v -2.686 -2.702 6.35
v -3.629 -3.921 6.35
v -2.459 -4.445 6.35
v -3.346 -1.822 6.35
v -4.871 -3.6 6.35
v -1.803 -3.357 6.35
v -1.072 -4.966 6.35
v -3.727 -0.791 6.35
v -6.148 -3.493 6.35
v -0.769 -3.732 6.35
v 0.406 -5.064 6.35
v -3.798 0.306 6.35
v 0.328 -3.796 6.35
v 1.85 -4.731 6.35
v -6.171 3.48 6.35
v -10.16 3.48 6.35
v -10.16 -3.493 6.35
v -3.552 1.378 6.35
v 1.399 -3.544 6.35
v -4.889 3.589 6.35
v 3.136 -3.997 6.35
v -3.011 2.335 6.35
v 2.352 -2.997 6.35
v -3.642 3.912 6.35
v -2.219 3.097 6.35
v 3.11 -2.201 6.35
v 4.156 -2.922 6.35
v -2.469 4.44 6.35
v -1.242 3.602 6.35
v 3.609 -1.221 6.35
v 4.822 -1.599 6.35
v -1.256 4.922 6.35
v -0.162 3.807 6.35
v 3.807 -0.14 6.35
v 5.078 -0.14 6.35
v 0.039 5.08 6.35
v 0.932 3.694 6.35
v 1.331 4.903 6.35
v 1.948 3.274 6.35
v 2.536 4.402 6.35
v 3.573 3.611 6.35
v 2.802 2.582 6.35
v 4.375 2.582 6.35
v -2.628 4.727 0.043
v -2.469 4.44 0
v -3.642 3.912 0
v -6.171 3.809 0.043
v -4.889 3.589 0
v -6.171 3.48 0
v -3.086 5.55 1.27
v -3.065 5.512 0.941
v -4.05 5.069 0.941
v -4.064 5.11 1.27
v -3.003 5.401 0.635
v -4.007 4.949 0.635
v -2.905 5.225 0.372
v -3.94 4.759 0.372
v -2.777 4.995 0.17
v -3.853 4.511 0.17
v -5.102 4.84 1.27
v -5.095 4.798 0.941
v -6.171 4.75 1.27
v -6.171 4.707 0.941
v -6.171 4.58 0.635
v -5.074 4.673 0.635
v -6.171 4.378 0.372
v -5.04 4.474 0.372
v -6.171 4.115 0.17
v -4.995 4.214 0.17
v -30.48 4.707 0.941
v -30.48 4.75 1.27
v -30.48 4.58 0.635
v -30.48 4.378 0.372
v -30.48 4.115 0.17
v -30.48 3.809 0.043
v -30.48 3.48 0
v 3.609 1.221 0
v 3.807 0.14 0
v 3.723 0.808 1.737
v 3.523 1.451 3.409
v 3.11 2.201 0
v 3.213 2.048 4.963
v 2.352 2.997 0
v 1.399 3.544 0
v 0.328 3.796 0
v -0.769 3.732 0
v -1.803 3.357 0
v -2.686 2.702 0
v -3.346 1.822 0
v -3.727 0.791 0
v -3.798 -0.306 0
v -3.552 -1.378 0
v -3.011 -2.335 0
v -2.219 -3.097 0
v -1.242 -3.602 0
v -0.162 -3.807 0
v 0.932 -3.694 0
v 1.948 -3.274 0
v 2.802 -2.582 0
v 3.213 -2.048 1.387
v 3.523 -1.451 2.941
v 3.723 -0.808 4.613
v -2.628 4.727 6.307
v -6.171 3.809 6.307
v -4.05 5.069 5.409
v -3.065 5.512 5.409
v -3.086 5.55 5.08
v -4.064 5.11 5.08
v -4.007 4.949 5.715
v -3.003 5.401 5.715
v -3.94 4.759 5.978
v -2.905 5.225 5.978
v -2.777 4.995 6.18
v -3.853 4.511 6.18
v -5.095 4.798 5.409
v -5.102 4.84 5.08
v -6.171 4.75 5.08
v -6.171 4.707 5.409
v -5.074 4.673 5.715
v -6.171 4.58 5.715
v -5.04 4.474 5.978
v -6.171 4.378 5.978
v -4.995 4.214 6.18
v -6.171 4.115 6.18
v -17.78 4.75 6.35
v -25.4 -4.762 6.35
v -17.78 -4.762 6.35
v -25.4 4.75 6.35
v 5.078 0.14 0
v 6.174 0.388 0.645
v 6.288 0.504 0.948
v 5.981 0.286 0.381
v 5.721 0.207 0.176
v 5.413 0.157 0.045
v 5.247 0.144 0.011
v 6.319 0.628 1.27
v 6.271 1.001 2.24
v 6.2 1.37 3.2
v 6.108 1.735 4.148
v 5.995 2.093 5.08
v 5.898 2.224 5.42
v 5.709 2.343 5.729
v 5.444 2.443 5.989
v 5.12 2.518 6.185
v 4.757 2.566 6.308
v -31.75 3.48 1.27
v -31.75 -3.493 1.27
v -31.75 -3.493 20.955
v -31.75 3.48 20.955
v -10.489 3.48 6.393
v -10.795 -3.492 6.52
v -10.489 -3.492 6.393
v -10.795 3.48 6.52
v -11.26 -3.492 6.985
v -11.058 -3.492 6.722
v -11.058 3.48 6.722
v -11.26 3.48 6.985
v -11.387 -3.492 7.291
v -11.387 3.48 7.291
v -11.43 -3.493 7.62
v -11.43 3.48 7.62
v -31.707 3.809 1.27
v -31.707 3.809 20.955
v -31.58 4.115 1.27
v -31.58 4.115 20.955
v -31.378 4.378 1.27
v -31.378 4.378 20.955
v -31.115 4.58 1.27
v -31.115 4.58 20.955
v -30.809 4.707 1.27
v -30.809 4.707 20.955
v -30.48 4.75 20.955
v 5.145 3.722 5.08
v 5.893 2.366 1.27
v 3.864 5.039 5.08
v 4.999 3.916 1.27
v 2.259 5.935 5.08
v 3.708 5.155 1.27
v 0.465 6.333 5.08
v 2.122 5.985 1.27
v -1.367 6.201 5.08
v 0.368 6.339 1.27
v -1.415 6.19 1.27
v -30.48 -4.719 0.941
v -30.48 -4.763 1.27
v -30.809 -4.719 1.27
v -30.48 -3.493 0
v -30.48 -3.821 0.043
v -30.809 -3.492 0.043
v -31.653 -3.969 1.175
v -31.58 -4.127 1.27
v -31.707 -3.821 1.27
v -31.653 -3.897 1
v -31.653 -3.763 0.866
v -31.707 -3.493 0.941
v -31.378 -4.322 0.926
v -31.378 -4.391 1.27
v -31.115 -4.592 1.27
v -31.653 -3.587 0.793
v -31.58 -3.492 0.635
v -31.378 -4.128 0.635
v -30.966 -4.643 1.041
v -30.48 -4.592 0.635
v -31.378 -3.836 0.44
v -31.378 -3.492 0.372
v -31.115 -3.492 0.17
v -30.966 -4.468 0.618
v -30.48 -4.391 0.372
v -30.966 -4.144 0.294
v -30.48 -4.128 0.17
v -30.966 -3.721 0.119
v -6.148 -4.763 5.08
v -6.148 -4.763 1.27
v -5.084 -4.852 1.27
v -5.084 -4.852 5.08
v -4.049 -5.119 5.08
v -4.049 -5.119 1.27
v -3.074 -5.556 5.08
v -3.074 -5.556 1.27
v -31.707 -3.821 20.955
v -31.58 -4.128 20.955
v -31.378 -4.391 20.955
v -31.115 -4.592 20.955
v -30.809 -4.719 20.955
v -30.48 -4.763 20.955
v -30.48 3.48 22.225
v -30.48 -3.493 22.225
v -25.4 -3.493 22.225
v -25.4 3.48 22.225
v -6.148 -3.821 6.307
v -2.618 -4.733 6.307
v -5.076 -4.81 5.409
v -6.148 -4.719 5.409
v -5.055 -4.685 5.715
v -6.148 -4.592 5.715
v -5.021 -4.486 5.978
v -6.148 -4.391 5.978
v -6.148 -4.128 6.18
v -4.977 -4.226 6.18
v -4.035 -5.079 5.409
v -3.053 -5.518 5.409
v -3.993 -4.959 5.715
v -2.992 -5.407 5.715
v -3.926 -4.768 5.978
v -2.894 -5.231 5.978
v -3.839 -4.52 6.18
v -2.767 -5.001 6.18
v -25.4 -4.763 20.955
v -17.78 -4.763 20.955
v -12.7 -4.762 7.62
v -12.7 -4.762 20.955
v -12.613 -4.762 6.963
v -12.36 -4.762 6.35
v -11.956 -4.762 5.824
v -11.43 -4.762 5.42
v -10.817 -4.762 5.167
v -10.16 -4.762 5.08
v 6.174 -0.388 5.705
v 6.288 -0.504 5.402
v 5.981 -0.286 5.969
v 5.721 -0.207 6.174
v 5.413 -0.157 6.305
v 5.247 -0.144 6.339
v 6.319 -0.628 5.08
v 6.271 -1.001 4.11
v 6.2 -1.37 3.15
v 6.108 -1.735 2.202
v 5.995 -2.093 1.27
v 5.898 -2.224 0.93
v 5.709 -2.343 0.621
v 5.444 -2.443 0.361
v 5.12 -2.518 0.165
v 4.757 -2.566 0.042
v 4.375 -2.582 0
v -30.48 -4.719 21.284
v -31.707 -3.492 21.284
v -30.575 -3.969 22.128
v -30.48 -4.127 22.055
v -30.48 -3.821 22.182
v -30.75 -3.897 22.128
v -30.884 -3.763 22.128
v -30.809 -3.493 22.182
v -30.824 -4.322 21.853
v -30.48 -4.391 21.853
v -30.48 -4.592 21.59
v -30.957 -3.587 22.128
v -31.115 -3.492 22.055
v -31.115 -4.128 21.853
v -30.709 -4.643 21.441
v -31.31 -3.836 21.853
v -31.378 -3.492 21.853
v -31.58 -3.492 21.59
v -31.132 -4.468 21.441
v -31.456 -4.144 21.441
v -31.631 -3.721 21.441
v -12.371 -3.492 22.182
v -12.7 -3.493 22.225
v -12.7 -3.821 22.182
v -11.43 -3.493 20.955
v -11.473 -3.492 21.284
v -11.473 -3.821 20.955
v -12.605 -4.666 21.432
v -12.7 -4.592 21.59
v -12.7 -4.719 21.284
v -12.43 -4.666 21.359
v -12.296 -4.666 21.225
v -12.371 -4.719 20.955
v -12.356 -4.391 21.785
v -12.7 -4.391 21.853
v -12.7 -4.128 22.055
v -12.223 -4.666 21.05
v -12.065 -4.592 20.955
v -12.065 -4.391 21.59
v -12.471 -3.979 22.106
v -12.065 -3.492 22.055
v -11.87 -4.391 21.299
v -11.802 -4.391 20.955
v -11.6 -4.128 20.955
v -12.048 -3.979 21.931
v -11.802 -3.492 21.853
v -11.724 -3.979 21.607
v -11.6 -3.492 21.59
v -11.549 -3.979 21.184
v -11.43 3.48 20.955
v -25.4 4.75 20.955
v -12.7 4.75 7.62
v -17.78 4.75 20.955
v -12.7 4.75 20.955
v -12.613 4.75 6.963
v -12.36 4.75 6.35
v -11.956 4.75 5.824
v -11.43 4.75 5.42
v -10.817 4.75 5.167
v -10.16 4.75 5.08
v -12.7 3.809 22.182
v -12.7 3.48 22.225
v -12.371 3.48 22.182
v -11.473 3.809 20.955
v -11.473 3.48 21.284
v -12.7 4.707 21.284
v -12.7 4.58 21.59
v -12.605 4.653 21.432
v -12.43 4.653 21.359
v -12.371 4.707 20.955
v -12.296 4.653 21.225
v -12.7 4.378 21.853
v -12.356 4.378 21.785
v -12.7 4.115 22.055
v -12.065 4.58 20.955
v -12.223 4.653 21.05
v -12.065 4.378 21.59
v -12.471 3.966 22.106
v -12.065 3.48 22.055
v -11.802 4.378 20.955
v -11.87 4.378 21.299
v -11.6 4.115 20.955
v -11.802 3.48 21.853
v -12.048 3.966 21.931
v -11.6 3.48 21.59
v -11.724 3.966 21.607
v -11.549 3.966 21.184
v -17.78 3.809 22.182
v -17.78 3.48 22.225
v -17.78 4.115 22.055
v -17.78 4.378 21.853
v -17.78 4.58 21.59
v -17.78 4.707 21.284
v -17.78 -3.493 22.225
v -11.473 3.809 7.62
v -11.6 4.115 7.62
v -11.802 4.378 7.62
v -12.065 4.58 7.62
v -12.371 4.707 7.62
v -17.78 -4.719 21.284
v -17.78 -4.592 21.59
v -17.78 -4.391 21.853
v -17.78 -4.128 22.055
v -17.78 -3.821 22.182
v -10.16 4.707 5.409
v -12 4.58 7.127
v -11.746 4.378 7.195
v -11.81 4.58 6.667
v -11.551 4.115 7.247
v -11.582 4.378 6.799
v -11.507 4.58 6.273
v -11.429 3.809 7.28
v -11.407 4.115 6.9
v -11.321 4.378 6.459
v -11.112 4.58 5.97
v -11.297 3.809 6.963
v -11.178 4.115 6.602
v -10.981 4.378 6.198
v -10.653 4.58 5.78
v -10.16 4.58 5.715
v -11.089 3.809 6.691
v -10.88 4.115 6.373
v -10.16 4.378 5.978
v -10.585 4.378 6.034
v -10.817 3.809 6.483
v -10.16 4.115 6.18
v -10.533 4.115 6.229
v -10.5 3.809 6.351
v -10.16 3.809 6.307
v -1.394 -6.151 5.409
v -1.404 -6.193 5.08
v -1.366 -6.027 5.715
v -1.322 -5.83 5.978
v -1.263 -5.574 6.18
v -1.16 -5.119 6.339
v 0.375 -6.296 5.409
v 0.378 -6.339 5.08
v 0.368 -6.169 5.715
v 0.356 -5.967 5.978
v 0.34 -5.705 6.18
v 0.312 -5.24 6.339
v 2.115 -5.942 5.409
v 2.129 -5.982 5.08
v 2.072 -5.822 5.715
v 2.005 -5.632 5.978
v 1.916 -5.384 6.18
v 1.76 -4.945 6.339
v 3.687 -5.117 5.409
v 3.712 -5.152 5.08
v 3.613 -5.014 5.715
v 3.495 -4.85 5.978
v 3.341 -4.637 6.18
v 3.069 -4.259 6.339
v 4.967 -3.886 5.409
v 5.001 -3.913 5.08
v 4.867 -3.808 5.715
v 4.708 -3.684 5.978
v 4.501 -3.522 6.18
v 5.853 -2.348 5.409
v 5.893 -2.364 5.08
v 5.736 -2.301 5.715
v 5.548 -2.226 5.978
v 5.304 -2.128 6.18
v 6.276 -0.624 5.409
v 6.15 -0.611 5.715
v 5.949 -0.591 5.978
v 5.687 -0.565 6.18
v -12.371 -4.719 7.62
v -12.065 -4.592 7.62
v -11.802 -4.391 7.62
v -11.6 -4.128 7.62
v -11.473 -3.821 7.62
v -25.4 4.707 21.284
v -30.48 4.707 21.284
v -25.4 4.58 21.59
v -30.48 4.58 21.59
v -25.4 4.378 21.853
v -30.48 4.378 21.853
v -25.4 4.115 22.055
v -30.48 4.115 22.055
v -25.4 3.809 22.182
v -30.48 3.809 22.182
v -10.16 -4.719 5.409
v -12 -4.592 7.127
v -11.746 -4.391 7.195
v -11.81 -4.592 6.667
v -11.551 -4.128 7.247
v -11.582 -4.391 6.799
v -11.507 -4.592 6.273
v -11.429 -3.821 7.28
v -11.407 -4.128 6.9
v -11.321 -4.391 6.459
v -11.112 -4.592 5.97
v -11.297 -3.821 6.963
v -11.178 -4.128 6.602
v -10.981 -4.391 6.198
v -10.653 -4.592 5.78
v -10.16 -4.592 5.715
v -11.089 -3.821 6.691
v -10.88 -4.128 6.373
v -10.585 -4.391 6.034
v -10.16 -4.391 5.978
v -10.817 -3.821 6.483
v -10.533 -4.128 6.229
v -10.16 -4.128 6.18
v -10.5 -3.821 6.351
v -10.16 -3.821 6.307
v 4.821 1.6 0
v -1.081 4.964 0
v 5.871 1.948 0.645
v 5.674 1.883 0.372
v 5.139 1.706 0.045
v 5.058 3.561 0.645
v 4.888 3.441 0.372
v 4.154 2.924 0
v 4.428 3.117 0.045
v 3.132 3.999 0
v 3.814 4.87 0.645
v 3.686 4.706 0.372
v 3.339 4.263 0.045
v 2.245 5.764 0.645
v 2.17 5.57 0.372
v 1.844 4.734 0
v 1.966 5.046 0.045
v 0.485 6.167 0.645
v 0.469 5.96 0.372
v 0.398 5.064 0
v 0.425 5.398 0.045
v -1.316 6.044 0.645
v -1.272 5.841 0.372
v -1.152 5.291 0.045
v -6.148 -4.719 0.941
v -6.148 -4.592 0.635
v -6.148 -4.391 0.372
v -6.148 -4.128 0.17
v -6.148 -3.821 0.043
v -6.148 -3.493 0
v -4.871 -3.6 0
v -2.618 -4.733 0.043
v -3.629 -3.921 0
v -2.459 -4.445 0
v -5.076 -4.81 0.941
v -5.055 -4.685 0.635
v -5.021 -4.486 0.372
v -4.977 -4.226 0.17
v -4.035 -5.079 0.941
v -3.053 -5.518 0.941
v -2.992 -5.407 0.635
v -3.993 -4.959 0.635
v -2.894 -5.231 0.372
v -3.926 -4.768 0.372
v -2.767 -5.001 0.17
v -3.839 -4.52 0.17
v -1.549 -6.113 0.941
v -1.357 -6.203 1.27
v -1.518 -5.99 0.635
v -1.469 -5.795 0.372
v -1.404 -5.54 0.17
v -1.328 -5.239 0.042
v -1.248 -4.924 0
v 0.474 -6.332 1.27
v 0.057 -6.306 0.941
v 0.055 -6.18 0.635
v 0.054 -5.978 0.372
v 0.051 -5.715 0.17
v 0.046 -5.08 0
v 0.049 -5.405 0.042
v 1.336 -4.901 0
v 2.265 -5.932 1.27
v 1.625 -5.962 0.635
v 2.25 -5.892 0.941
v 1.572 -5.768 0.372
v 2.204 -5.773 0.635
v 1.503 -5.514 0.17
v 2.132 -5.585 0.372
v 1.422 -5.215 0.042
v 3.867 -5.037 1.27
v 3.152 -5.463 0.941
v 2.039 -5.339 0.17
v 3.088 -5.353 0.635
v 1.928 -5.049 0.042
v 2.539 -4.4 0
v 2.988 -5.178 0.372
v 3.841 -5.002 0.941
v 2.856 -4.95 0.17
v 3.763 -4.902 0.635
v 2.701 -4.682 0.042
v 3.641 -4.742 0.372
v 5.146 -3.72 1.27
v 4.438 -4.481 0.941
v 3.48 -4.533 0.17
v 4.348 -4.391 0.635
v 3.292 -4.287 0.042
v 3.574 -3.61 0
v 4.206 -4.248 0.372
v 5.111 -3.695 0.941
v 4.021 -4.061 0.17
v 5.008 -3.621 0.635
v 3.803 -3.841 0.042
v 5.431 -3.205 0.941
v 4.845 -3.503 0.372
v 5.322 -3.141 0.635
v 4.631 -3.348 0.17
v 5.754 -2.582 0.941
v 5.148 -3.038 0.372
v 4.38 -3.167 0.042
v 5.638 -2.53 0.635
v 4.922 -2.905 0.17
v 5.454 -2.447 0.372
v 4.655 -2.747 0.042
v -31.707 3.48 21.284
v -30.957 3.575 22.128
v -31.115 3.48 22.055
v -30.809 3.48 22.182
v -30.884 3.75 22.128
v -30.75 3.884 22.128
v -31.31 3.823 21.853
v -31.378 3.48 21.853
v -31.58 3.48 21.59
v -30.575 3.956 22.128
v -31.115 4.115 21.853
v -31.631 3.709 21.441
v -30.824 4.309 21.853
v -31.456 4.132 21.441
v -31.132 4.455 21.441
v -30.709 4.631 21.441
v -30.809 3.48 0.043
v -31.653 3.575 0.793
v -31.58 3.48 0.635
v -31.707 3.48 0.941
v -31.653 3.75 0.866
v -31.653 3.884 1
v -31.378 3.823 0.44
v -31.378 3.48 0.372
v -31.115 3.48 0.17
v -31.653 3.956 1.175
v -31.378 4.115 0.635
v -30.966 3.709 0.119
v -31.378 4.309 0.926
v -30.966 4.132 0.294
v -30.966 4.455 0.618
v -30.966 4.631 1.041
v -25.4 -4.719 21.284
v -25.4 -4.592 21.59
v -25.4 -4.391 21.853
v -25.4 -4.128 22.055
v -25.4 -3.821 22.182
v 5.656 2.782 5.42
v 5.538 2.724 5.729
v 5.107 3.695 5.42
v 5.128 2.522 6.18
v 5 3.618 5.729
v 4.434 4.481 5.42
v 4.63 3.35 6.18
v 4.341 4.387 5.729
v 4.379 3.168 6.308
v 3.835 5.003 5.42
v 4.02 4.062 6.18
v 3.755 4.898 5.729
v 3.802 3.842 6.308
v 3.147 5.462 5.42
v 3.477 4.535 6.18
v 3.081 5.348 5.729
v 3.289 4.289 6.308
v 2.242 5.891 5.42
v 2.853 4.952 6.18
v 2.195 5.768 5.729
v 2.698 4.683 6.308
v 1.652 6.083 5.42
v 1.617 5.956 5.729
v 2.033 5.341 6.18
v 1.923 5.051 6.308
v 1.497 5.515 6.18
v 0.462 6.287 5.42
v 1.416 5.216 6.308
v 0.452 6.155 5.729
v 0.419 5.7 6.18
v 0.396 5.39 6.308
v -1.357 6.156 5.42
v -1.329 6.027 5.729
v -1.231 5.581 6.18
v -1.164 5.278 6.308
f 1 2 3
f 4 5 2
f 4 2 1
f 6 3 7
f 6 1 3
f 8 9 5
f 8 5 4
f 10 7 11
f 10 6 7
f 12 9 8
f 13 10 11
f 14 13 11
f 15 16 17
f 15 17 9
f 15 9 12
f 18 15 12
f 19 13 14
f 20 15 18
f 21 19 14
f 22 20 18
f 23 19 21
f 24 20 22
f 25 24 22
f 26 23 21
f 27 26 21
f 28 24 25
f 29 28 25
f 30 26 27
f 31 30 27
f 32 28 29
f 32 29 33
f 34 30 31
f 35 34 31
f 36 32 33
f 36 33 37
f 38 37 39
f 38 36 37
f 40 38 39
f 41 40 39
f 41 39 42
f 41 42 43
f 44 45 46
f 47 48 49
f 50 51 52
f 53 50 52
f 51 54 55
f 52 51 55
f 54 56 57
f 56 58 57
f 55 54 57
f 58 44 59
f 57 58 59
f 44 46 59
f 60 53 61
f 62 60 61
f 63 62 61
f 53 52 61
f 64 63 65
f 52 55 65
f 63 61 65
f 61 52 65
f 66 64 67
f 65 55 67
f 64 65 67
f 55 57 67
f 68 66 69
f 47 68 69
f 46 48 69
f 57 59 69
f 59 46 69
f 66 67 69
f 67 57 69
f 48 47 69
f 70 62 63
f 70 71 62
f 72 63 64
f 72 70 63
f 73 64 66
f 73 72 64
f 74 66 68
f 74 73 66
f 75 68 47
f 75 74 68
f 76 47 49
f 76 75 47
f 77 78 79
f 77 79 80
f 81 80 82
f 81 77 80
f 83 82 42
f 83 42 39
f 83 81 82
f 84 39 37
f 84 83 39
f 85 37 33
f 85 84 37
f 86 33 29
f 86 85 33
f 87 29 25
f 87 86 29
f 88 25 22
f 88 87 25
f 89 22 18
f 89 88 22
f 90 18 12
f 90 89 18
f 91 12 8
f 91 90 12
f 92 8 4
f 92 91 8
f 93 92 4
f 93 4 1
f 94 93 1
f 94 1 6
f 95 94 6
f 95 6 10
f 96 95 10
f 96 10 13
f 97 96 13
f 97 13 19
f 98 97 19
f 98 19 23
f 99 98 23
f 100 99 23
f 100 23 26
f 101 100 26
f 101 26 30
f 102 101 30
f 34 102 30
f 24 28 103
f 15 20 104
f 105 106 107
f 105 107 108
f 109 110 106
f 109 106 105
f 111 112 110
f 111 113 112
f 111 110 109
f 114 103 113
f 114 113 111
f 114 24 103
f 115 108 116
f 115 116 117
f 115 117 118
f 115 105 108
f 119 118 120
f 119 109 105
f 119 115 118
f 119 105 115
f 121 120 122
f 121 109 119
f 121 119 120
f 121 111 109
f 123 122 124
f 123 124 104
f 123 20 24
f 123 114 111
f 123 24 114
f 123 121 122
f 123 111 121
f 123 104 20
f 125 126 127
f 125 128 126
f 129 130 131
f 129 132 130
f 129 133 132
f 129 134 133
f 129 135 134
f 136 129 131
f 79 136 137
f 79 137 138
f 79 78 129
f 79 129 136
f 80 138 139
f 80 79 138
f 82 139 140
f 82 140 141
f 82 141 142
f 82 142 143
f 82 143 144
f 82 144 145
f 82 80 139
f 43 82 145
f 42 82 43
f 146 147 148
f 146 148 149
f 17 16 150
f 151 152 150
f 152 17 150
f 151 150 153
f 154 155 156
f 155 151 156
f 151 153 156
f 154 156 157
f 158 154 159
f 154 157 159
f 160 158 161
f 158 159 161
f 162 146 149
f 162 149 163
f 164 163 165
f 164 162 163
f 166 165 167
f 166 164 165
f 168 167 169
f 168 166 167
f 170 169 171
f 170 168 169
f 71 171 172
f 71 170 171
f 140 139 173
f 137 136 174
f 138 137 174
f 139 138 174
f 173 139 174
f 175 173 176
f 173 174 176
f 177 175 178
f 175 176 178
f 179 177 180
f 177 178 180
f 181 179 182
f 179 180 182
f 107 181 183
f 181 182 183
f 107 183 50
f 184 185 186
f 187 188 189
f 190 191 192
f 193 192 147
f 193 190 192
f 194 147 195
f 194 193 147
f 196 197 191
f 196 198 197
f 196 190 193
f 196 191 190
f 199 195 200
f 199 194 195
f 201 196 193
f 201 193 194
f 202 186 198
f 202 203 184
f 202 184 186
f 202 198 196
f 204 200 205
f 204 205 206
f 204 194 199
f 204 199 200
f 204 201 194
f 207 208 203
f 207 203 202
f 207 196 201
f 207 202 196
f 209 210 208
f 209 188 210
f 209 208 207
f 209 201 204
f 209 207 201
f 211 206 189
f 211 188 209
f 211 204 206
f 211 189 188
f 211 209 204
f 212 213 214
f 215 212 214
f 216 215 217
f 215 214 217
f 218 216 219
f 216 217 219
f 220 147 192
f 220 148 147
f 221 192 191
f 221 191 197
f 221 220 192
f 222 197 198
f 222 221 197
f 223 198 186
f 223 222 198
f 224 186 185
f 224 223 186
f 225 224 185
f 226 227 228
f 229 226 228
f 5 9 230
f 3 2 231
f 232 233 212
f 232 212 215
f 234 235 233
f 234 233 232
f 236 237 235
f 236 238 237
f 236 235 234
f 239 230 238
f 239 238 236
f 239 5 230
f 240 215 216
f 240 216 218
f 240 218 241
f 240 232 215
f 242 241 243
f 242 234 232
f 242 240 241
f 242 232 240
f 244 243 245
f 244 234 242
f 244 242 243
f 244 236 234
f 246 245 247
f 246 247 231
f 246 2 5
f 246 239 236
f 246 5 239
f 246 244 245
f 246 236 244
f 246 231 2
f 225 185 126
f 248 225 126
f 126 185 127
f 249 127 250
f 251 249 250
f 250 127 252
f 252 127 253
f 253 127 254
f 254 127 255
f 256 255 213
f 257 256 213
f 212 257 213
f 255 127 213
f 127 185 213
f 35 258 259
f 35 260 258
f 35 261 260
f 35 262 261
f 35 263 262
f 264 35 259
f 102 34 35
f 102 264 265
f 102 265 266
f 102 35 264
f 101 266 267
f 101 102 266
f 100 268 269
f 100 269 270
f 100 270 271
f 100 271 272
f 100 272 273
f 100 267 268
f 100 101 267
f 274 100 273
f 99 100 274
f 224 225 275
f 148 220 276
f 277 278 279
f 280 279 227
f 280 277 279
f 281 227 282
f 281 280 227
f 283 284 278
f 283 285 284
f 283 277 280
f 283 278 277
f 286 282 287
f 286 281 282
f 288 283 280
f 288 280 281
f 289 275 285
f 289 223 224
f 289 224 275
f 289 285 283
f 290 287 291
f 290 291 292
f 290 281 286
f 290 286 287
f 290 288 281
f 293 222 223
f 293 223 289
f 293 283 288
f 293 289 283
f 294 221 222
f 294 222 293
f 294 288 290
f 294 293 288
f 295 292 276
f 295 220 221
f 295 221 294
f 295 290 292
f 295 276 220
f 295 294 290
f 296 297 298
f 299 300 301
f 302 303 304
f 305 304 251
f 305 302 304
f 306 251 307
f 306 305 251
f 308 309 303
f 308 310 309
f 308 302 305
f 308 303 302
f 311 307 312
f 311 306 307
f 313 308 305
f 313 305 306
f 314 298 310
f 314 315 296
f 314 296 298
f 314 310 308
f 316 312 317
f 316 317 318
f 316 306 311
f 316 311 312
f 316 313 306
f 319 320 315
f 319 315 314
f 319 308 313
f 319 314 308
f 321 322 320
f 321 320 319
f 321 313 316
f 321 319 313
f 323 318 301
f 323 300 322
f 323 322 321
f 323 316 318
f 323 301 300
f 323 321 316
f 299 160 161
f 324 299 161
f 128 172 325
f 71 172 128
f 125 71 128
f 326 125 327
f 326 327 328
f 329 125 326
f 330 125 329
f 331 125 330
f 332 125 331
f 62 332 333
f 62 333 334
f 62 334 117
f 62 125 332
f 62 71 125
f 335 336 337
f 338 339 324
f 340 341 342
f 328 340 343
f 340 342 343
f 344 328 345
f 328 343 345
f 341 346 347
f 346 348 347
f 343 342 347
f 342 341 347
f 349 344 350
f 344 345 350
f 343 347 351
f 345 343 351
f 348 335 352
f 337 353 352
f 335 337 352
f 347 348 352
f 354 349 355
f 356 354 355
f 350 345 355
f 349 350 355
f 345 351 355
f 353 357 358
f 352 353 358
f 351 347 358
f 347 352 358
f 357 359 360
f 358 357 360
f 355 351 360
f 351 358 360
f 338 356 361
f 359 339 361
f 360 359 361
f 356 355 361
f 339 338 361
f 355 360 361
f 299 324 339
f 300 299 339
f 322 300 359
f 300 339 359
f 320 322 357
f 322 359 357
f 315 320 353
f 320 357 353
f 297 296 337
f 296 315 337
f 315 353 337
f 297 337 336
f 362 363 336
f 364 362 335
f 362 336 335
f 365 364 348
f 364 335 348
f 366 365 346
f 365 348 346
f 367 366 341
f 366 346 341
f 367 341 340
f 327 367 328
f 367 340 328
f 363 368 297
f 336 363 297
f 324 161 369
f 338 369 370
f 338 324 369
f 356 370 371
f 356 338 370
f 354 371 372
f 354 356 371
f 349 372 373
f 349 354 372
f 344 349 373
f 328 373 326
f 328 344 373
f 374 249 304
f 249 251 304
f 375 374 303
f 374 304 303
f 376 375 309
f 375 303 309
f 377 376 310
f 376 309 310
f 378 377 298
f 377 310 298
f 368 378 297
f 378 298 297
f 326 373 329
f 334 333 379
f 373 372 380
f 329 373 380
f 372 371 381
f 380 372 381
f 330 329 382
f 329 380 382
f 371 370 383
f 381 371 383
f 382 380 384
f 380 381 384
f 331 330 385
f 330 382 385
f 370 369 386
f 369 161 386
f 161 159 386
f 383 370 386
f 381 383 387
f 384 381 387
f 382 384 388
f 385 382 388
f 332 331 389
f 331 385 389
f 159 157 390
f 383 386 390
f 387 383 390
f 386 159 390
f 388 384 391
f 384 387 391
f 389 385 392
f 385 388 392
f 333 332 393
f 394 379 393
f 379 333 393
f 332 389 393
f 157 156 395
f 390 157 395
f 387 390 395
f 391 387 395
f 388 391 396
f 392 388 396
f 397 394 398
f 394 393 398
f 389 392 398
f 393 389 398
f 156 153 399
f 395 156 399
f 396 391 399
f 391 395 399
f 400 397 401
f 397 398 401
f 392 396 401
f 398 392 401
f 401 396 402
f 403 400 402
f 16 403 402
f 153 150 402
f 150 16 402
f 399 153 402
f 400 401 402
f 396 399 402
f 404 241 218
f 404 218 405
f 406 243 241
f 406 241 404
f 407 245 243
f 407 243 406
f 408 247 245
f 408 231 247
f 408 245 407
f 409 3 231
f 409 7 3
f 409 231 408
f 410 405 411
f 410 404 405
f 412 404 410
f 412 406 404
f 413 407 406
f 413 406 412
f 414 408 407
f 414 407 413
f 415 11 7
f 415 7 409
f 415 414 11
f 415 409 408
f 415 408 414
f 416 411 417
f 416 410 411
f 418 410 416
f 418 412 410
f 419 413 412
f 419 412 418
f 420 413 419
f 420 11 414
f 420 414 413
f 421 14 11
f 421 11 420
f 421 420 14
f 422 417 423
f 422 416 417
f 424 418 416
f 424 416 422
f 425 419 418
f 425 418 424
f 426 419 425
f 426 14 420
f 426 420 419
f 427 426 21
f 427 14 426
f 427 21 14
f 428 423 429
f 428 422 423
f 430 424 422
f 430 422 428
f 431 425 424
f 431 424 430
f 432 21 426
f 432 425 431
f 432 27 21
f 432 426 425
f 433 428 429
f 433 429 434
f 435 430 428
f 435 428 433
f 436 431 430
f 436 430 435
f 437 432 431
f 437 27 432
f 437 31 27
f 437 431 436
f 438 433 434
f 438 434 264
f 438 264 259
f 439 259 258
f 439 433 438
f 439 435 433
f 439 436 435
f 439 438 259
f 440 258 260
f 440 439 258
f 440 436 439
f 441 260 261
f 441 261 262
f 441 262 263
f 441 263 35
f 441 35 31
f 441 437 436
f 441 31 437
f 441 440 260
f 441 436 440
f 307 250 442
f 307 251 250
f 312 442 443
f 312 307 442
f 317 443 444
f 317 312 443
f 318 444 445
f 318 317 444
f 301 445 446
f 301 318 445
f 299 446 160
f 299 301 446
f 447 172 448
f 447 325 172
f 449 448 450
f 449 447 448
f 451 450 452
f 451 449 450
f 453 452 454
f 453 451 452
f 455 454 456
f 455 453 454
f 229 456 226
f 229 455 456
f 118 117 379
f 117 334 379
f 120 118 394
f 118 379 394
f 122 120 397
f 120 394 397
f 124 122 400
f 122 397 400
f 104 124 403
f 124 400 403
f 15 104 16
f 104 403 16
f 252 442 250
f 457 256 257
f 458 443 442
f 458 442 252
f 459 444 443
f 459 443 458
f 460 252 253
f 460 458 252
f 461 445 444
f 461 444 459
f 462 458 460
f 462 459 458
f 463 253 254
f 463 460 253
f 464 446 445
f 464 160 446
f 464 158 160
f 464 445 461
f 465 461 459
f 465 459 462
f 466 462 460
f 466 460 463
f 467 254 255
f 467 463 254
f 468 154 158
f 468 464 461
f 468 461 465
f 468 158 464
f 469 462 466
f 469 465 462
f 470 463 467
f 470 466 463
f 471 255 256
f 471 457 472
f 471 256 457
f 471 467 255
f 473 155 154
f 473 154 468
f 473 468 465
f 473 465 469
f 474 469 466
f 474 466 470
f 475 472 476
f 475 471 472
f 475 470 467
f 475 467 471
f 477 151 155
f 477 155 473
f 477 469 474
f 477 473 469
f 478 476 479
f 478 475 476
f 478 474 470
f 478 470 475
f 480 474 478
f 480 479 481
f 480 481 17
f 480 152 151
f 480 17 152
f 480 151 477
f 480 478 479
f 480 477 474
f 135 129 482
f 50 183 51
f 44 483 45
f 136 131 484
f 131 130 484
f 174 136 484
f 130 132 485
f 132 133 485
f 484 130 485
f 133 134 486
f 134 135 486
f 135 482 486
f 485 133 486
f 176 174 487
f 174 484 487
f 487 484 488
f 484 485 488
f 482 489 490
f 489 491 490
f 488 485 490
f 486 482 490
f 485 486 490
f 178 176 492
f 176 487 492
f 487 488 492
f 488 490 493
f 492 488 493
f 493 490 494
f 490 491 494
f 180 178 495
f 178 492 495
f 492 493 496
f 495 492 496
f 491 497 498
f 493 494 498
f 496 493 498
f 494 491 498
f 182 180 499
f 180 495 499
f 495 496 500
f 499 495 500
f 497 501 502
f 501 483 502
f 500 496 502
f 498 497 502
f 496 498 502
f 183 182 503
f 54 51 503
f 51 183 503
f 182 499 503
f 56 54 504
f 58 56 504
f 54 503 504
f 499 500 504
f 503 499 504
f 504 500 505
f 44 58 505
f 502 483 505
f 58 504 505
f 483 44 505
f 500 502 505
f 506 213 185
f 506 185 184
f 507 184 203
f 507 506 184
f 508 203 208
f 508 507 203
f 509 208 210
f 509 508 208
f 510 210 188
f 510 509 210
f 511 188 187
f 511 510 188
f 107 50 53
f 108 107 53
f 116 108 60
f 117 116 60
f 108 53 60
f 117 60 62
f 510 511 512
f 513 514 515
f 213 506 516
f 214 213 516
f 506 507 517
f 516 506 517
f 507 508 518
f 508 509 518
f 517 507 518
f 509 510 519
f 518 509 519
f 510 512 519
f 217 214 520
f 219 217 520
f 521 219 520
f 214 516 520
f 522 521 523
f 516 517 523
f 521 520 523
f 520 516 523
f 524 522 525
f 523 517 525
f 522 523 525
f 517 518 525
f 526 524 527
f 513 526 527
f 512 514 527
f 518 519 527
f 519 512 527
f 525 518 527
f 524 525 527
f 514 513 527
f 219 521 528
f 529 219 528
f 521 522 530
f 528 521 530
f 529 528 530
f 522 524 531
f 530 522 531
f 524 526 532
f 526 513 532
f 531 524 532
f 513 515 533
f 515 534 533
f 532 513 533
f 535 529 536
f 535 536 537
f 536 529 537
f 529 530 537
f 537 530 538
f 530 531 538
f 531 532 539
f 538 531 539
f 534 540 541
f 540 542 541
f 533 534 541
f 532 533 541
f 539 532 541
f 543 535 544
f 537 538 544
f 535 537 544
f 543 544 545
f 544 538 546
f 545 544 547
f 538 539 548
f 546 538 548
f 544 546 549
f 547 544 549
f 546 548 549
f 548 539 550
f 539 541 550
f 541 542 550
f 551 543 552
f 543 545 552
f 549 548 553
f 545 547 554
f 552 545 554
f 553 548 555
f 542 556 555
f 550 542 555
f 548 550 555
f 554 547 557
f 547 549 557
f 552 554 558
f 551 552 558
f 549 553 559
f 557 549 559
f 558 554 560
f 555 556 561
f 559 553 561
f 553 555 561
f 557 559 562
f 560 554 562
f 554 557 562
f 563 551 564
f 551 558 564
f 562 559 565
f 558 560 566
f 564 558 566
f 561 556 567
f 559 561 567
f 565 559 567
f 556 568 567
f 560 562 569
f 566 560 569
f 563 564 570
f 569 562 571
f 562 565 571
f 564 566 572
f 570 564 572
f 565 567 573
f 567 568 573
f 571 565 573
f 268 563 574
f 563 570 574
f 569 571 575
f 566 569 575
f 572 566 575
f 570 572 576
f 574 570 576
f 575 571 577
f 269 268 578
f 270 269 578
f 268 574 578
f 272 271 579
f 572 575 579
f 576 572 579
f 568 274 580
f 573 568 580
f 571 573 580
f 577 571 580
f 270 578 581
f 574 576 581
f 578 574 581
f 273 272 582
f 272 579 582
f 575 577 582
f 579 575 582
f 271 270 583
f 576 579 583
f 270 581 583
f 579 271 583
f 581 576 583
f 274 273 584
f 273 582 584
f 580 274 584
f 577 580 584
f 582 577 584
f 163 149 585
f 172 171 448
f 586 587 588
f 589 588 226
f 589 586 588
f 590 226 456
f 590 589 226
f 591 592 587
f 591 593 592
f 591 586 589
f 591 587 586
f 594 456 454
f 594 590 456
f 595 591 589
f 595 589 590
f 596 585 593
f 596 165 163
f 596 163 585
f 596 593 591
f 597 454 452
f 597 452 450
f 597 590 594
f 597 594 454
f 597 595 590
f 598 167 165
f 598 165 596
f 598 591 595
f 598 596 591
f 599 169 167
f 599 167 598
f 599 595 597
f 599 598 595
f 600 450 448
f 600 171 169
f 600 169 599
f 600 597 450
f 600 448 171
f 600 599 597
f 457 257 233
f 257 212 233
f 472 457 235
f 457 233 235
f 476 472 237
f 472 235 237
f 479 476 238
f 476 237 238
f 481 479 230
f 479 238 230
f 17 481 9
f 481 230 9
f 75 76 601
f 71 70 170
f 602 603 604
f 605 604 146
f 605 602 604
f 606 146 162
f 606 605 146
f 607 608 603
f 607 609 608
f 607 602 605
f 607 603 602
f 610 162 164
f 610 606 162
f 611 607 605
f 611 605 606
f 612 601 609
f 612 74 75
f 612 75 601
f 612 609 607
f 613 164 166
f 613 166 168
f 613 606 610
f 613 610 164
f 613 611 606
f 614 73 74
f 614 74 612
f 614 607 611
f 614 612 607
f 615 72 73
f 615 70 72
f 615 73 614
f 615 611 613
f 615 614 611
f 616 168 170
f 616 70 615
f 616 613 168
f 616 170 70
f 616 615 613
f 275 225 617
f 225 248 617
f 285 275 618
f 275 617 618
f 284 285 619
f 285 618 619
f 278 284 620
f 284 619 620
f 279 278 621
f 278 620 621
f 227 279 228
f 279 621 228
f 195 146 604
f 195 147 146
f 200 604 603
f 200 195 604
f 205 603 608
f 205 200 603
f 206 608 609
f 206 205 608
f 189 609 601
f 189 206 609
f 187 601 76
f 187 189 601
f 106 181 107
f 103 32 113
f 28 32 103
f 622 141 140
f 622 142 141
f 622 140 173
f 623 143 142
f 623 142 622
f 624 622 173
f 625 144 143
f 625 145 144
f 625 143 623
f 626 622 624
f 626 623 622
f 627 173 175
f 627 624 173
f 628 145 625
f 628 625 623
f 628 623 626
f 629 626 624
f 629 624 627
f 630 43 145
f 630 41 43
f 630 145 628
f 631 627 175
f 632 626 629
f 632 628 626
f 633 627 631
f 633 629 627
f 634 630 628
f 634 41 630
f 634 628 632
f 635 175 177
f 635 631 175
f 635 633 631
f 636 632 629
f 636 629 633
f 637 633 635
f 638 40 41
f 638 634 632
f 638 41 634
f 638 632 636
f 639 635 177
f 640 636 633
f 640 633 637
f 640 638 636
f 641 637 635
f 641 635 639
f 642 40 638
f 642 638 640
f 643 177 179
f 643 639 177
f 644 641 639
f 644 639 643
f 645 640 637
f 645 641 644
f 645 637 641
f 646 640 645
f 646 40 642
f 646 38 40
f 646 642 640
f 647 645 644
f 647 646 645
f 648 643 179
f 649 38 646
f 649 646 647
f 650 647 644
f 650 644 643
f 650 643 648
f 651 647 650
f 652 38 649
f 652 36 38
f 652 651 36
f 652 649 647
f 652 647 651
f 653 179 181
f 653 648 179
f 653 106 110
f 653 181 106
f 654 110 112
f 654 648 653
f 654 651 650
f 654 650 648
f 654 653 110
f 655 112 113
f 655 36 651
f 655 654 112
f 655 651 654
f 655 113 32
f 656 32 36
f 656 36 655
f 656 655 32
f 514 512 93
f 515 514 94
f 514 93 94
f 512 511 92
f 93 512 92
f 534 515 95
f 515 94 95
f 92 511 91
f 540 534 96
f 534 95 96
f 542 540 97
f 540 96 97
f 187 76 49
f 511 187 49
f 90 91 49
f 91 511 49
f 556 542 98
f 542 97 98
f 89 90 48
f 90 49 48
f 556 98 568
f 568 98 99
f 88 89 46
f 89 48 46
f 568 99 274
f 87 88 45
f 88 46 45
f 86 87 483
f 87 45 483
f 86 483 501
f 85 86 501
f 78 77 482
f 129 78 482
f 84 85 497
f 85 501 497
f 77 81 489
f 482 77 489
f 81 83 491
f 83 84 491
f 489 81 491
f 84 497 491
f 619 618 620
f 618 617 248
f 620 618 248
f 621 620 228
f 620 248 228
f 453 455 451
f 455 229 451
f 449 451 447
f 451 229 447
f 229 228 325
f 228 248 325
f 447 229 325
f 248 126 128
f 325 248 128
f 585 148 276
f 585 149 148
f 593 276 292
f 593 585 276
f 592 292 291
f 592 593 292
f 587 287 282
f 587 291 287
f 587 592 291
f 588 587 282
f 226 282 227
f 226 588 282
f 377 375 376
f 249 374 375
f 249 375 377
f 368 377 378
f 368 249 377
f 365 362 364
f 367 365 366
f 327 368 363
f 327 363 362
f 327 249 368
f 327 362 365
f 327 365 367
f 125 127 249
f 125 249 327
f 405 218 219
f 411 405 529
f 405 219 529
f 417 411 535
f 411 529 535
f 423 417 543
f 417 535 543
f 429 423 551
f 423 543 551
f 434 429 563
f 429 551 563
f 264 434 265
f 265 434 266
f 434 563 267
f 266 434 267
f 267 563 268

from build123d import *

# Parameters (mm, degrees)
F0_R     = 3.81
F1_DEPTH = 6.35
F2_W     = 6.35
F2_H     = 9.5123
F3_DEPTH = 15.875
F4_R     = 1.27
F6_DEPTH = 6.351


with BuildPart() as f1:
    # F0 (on Top) → F1 (new body)
    with BuildSketch(Plane.XY):
        with BuildLine():
            ThreePointArc((-6.1483610621, -4.7625), (-4.5608610621, -4.9641389379), (-3.0741805311, -5.55625))
            ThreePointArc((-3.0741805311, -5.55625), (6.3499966259, 0.0065460587), (-3.0856295938, 5.5499))
            ThreePointArc((-3.0856295938, 5.5499), (-4.577421837, 4.9530787195), (-6.1712591876, 4.7498))
            Line((-6.1712591876, 4.7498), (-31.75, 4.7498))
            Line((-31.75, 4.7498), (-31.75, -4.7625))
            Line((-31.75, -4.7625), (-6.1483610621, -4.7625))
        make_face()
        Circle(F0_R, mode=Mode.SUBTRACT)
    extrude(amount=F1_DEPTH)

    # F2 (on face) → F3 (join)
    with BuildSketch(Plane.XY.offset(6.35)):
        with Locations((-28.575, -0.00635)):
            Rectangle(F2_W, F2_H)
        with Locations((-14.605, -0.00635)):
            Rectangle(F2_W, F2_H)
    extrude(amount=F3_DEPTH)

    # F4
    f4_edges = [f1.edges().sort_by_distance(p)[0] for p in [
        (-18.949181, -4.7625, 0),
        (-8.789181, -4.7625, 6.35),
        (-11.43, -0.00635, 6.35),
        (-11.43, -0.00635, 22.225),
        (-31.75, -4.7625, 11.1125),
        (-31.75, -0.00635, 0),
        (-31.75, 4.7498, 11.1125),
        (-28.575, -4.7625, 22.225),
        (-31.75, -0.00635, 22.225),
        (-28.575, 4.7498, 22.225),
        (-14.605, -4.7625, 22.225),
        (-14.605, 4.7498, 22.225),
        (-4.560861, -4.964139, 0),
        (-4.560861, -4.964139, 6.35),
        (-4.577422, 4.953079, 6.35),
        (-4.577422, 4.953079, 0),
        (-11.43, 4.7498, 14.2875),
        (-18.96063, 4.7498, 0),
        (-11.43, -4.7625, 14.2875),
    ]]
    fillet(f4_edges, radius=F4_R)

    # F5 (on Right) → F6 (cut, through all)
    with BuildSketch(Plane.YZ):
        Polygon((-4.3603489199, -4.6240965693), (-1.9896510801, -5.5359034307), (4.3603489199, 10.9740965693), (1.9896510801, 11.8859034307), align=None)
    extrude(amount=F6_DEPTH, mode=Mode.SUBTRACT)


solid = f1.part
